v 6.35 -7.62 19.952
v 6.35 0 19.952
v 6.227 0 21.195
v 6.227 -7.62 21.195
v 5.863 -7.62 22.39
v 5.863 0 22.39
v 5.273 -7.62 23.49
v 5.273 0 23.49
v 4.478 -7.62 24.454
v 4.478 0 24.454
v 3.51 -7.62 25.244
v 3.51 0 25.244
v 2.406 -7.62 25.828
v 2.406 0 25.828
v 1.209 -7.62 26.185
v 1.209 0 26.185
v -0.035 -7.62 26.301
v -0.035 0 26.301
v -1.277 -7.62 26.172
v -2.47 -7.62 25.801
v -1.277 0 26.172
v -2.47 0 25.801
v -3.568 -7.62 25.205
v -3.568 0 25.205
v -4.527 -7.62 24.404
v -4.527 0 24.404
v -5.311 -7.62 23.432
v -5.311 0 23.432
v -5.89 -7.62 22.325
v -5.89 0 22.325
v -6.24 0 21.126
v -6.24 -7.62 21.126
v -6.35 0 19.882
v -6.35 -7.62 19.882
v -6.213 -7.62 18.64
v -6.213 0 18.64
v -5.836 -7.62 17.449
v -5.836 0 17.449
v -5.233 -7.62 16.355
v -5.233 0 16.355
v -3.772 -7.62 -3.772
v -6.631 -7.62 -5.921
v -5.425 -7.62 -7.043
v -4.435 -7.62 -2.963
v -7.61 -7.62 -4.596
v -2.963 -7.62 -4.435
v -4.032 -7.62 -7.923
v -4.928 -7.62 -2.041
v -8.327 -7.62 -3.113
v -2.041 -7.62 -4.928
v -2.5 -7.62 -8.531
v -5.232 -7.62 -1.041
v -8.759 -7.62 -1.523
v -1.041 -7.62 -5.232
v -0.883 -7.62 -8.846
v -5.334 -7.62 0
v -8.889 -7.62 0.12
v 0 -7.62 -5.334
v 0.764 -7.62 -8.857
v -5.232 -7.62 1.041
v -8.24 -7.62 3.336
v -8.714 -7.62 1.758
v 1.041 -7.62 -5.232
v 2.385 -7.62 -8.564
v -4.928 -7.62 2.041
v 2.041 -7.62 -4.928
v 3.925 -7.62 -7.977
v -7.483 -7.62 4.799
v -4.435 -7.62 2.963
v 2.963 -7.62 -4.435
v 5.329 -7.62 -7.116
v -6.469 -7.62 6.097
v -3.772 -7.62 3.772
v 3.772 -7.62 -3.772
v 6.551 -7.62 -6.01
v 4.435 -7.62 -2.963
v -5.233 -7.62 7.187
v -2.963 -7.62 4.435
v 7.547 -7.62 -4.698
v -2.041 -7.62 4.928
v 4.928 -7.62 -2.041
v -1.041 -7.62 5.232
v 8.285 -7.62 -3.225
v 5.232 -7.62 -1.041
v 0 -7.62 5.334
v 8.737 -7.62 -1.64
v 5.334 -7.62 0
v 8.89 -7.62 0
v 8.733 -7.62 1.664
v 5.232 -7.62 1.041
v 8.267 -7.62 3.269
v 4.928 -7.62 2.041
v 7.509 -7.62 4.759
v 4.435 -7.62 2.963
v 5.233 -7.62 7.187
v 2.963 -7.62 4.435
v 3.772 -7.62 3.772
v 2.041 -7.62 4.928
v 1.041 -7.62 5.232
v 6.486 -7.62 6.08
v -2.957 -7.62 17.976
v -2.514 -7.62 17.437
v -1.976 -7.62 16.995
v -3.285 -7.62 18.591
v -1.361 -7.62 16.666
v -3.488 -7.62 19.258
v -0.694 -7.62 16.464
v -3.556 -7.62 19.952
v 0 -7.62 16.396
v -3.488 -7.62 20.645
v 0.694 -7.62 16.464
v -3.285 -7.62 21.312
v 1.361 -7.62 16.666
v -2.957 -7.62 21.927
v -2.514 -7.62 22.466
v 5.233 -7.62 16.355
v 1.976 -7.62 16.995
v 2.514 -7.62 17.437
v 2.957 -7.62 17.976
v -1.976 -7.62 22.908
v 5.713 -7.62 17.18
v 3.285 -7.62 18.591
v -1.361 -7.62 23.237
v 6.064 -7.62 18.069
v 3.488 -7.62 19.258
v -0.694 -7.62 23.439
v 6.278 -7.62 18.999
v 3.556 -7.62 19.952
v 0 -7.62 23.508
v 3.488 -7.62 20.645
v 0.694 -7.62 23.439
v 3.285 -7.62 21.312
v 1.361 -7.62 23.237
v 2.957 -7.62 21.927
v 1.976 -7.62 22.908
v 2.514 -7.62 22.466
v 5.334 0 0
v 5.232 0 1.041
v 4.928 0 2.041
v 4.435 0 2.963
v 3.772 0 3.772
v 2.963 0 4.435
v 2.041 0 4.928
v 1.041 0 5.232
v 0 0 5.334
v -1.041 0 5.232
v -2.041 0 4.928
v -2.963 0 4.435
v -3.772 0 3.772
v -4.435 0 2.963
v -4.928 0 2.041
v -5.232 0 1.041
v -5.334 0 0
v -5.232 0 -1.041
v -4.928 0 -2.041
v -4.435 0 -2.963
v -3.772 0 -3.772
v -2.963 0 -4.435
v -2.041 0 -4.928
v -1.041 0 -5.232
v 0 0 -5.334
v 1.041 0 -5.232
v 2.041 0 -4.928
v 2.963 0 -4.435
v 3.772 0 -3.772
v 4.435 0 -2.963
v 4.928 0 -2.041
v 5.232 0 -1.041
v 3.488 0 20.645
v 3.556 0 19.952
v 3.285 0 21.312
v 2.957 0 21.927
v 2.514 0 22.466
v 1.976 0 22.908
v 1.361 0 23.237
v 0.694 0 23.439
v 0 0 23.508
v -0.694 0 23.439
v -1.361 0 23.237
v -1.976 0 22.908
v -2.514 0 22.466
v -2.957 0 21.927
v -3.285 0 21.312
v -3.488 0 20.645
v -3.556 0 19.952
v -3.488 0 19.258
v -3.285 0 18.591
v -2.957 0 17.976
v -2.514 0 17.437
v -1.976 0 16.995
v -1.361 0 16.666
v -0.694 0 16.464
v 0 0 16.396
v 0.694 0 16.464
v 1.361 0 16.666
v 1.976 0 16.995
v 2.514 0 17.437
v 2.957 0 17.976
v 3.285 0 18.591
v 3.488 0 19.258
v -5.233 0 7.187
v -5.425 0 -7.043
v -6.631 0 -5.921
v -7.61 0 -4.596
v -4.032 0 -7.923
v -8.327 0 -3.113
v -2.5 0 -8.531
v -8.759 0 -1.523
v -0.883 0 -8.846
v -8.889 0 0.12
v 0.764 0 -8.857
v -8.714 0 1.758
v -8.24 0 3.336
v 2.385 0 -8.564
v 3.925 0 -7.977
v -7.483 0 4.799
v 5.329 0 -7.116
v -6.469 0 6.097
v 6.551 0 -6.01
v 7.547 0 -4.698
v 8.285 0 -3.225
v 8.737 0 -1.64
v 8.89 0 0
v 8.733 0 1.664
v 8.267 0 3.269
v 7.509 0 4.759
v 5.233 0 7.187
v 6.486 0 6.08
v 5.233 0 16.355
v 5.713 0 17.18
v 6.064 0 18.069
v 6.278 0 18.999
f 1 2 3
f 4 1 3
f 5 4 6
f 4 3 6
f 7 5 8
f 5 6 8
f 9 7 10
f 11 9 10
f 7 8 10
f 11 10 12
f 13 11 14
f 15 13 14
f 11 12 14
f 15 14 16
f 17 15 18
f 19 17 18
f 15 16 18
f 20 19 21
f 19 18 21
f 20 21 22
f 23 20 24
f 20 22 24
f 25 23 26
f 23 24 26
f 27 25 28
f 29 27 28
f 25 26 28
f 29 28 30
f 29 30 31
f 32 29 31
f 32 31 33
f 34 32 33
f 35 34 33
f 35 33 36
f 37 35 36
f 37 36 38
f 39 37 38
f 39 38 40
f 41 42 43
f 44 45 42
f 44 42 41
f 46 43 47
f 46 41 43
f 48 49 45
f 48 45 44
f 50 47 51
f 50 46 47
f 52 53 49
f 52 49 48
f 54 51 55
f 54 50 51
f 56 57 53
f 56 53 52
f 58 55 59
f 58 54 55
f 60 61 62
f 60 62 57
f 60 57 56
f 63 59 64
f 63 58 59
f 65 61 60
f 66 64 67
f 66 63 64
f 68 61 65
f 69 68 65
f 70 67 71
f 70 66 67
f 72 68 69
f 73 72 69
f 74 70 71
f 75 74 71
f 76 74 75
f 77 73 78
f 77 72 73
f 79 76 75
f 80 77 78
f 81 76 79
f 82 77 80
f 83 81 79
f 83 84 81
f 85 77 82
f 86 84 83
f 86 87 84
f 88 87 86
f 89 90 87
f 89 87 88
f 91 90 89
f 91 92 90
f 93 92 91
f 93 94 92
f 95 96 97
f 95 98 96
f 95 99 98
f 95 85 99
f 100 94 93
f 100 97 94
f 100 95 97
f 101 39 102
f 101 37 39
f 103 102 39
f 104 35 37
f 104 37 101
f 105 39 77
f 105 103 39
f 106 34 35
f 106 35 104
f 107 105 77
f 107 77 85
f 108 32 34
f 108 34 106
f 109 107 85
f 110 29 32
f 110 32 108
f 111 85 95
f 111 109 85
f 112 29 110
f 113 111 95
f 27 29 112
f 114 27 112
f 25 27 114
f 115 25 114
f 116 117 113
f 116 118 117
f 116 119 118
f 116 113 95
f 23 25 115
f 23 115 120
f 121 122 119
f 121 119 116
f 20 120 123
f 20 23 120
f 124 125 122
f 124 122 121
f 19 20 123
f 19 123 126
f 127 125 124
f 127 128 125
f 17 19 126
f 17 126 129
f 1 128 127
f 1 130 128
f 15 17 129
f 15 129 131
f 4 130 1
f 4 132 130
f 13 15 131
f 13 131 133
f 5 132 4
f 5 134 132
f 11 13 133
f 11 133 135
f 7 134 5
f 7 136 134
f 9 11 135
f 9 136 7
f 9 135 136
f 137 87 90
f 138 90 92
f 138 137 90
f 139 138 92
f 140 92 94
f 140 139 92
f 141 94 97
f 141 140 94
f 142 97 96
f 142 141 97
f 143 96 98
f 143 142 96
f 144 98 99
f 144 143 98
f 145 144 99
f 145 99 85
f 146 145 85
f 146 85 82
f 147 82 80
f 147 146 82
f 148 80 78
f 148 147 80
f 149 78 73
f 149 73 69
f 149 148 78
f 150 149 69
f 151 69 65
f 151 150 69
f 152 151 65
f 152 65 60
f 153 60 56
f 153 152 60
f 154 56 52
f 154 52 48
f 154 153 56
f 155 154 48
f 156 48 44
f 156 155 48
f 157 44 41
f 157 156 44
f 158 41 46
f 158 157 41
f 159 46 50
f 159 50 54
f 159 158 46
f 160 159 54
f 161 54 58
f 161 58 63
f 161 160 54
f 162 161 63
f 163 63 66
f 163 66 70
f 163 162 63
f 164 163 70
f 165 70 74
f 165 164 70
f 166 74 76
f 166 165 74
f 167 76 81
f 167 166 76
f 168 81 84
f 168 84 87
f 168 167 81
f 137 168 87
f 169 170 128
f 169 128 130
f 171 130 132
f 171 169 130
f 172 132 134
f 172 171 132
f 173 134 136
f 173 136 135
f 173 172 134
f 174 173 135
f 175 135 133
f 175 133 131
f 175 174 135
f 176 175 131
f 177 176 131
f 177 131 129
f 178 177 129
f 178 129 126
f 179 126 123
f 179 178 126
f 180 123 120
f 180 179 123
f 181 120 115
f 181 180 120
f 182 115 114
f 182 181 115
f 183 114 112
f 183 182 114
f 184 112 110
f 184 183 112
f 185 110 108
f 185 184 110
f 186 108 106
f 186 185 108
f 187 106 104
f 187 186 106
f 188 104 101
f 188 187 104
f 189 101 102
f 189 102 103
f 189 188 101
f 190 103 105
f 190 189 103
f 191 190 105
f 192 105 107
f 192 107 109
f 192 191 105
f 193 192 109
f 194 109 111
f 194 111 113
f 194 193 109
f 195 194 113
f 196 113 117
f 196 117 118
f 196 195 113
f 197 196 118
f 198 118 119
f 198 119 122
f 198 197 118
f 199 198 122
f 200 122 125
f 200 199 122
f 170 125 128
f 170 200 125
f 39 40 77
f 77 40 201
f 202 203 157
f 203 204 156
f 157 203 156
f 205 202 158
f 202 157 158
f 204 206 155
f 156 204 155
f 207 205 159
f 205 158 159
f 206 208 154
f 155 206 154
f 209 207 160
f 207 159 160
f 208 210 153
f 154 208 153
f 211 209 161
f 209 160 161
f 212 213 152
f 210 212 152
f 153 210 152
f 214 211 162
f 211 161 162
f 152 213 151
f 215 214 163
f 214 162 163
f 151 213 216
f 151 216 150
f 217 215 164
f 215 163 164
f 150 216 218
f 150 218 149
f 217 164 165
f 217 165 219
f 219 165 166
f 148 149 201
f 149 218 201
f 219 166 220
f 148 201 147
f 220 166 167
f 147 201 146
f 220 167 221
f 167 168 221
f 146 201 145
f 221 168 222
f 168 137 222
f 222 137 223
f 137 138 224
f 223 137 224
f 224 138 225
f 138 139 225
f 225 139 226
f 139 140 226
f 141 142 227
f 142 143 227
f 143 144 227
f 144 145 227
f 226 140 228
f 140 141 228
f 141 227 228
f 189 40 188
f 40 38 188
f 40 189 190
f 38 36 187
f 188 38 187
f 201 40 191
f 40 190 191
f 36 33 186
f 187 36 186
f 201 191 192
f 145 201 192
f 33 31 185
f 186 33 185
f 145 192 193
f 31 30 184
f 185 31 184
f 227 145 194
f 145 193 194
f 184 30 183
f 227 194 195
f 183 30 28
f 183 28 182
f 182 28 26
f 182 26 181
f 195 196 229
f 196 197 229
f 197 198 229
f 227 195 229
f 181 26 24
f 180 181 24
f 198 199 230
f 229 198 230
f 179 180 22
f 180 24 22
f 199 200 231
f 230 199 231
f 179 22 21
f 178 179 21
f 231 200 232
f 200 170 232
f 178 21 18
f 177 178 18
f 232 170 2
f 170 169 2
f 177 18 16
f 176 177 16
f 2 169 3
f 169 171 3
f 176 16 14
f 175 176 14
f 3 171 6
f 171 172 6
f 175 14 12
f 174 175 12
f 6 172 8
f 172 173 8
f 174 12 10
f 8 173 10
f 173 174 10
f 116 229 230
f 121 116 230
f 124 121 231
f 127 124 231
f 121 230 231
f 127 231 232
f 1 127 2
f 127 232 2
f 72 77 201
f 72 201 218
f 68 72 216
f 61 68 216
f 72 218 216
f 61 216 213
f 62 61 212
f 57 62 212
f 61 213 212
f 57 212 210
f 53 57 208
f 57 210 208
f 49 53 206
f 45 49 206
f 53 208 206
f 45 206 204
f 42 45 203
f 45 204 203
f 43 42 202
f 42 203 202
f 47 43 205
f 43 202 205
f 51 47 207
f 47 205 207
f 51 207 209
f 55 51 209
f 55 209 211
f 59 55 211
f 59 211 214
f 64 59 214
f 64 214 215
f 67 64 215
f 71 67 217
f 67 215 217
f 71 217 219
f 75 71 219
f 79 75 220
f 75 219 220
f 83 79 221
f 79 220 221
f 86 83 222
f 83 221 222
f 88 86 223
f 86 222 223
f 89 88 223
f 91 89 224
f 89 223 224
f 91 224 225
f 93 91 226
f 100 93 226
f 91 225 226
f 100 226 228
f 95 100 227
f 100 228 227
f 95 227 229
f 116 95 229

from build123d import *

# Parameters (mm, degrees)
F0_R     = 3.556
F0_R_2   = 5.334
F1_DEPTH = 7.62


with BuildPart() as f1:
    # F0 (on Front) → F1 (new body)
    with BuildSketch(Plane.XZ):
        with BuildLine():
            ThreePointArc((-5.233176, 7.186513), (0, 8.89), (5.233176, 7.186513))
            Line((5.233176, 7.186513), (5.233176, 16.354866))
            ThreePointArc((5.233176, 16.354866), (0, 13.601582), (-5.233176, 16.354866))
            Line((-5.233176, 16.354866), (-5.233176, 7.186513))
        make_face()
        with BuildLine():
            ThreePointArc((-5.233176, 16.354866), (0, 13.601582), (5.233176, 16.354866))
            ThreePointArc((5.233176, 16.354866), (6.06437, 18.068522), (6.35, 19.951582))
            ThreePointArc((6.35, 19.951582), (-1.88306, 26.015952), (-5.233176, 16.354866))
        make_face()
        with Locations((0, 19.951582)):
            Circle(F0_R, mode=Mode.SUBTRACT)
        with BuildLine():
            ThreePointArc((-5.233176, 7.186513), (-4.031697, -7.923227), (8.89, 0))
            ThreePointArc((8.89, 0), (7.923227, 4.031697), (5.233176, 7.186513))
            ThreePointArc((5.233176, 7.186513), (0, 8.89), (-5.233176, 7.186513))
        make_face()
        Circle(F0_R_2, mode=Mode.SUBTRACT)
    extrude(amount=F1_DEPTH)


solid = f1.part
